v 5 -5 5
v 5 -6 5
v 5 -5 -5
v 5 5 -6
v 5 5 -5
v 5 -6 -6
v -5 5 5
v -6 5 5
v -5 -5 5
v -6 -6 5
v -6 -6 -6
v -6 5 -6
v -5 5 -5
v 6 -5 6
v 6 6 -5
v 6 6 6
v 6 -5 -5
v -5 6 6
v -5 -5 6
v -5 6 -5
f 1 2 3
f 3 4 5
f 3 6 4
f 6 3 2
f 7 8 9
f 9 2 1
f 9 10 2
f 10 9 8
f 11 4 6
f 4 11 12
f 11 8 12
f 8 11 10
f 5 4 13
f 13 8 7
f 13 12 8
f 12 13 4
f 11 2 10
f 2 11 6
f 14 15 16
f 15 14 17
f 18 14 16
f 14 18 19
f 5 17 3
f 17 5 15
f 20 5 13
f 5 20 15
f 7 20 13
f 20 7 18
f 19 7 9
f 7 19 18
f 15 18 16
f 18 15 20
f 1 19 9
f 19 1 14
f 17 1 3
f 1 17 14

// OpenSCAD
// Unit of length: Unit.MM
union()
{
   color(c = [1.0, 0.0, 0.0, 1.0])
   {
      translate(v = [-0.5, -0.5, -0.5])
      {
         cube(size = 11.0, center = true);
      }
   }
   translate(v = [0.5, 0.5, 0.5])
   {
      cube(size = 11.0, center = true);
   }
}
